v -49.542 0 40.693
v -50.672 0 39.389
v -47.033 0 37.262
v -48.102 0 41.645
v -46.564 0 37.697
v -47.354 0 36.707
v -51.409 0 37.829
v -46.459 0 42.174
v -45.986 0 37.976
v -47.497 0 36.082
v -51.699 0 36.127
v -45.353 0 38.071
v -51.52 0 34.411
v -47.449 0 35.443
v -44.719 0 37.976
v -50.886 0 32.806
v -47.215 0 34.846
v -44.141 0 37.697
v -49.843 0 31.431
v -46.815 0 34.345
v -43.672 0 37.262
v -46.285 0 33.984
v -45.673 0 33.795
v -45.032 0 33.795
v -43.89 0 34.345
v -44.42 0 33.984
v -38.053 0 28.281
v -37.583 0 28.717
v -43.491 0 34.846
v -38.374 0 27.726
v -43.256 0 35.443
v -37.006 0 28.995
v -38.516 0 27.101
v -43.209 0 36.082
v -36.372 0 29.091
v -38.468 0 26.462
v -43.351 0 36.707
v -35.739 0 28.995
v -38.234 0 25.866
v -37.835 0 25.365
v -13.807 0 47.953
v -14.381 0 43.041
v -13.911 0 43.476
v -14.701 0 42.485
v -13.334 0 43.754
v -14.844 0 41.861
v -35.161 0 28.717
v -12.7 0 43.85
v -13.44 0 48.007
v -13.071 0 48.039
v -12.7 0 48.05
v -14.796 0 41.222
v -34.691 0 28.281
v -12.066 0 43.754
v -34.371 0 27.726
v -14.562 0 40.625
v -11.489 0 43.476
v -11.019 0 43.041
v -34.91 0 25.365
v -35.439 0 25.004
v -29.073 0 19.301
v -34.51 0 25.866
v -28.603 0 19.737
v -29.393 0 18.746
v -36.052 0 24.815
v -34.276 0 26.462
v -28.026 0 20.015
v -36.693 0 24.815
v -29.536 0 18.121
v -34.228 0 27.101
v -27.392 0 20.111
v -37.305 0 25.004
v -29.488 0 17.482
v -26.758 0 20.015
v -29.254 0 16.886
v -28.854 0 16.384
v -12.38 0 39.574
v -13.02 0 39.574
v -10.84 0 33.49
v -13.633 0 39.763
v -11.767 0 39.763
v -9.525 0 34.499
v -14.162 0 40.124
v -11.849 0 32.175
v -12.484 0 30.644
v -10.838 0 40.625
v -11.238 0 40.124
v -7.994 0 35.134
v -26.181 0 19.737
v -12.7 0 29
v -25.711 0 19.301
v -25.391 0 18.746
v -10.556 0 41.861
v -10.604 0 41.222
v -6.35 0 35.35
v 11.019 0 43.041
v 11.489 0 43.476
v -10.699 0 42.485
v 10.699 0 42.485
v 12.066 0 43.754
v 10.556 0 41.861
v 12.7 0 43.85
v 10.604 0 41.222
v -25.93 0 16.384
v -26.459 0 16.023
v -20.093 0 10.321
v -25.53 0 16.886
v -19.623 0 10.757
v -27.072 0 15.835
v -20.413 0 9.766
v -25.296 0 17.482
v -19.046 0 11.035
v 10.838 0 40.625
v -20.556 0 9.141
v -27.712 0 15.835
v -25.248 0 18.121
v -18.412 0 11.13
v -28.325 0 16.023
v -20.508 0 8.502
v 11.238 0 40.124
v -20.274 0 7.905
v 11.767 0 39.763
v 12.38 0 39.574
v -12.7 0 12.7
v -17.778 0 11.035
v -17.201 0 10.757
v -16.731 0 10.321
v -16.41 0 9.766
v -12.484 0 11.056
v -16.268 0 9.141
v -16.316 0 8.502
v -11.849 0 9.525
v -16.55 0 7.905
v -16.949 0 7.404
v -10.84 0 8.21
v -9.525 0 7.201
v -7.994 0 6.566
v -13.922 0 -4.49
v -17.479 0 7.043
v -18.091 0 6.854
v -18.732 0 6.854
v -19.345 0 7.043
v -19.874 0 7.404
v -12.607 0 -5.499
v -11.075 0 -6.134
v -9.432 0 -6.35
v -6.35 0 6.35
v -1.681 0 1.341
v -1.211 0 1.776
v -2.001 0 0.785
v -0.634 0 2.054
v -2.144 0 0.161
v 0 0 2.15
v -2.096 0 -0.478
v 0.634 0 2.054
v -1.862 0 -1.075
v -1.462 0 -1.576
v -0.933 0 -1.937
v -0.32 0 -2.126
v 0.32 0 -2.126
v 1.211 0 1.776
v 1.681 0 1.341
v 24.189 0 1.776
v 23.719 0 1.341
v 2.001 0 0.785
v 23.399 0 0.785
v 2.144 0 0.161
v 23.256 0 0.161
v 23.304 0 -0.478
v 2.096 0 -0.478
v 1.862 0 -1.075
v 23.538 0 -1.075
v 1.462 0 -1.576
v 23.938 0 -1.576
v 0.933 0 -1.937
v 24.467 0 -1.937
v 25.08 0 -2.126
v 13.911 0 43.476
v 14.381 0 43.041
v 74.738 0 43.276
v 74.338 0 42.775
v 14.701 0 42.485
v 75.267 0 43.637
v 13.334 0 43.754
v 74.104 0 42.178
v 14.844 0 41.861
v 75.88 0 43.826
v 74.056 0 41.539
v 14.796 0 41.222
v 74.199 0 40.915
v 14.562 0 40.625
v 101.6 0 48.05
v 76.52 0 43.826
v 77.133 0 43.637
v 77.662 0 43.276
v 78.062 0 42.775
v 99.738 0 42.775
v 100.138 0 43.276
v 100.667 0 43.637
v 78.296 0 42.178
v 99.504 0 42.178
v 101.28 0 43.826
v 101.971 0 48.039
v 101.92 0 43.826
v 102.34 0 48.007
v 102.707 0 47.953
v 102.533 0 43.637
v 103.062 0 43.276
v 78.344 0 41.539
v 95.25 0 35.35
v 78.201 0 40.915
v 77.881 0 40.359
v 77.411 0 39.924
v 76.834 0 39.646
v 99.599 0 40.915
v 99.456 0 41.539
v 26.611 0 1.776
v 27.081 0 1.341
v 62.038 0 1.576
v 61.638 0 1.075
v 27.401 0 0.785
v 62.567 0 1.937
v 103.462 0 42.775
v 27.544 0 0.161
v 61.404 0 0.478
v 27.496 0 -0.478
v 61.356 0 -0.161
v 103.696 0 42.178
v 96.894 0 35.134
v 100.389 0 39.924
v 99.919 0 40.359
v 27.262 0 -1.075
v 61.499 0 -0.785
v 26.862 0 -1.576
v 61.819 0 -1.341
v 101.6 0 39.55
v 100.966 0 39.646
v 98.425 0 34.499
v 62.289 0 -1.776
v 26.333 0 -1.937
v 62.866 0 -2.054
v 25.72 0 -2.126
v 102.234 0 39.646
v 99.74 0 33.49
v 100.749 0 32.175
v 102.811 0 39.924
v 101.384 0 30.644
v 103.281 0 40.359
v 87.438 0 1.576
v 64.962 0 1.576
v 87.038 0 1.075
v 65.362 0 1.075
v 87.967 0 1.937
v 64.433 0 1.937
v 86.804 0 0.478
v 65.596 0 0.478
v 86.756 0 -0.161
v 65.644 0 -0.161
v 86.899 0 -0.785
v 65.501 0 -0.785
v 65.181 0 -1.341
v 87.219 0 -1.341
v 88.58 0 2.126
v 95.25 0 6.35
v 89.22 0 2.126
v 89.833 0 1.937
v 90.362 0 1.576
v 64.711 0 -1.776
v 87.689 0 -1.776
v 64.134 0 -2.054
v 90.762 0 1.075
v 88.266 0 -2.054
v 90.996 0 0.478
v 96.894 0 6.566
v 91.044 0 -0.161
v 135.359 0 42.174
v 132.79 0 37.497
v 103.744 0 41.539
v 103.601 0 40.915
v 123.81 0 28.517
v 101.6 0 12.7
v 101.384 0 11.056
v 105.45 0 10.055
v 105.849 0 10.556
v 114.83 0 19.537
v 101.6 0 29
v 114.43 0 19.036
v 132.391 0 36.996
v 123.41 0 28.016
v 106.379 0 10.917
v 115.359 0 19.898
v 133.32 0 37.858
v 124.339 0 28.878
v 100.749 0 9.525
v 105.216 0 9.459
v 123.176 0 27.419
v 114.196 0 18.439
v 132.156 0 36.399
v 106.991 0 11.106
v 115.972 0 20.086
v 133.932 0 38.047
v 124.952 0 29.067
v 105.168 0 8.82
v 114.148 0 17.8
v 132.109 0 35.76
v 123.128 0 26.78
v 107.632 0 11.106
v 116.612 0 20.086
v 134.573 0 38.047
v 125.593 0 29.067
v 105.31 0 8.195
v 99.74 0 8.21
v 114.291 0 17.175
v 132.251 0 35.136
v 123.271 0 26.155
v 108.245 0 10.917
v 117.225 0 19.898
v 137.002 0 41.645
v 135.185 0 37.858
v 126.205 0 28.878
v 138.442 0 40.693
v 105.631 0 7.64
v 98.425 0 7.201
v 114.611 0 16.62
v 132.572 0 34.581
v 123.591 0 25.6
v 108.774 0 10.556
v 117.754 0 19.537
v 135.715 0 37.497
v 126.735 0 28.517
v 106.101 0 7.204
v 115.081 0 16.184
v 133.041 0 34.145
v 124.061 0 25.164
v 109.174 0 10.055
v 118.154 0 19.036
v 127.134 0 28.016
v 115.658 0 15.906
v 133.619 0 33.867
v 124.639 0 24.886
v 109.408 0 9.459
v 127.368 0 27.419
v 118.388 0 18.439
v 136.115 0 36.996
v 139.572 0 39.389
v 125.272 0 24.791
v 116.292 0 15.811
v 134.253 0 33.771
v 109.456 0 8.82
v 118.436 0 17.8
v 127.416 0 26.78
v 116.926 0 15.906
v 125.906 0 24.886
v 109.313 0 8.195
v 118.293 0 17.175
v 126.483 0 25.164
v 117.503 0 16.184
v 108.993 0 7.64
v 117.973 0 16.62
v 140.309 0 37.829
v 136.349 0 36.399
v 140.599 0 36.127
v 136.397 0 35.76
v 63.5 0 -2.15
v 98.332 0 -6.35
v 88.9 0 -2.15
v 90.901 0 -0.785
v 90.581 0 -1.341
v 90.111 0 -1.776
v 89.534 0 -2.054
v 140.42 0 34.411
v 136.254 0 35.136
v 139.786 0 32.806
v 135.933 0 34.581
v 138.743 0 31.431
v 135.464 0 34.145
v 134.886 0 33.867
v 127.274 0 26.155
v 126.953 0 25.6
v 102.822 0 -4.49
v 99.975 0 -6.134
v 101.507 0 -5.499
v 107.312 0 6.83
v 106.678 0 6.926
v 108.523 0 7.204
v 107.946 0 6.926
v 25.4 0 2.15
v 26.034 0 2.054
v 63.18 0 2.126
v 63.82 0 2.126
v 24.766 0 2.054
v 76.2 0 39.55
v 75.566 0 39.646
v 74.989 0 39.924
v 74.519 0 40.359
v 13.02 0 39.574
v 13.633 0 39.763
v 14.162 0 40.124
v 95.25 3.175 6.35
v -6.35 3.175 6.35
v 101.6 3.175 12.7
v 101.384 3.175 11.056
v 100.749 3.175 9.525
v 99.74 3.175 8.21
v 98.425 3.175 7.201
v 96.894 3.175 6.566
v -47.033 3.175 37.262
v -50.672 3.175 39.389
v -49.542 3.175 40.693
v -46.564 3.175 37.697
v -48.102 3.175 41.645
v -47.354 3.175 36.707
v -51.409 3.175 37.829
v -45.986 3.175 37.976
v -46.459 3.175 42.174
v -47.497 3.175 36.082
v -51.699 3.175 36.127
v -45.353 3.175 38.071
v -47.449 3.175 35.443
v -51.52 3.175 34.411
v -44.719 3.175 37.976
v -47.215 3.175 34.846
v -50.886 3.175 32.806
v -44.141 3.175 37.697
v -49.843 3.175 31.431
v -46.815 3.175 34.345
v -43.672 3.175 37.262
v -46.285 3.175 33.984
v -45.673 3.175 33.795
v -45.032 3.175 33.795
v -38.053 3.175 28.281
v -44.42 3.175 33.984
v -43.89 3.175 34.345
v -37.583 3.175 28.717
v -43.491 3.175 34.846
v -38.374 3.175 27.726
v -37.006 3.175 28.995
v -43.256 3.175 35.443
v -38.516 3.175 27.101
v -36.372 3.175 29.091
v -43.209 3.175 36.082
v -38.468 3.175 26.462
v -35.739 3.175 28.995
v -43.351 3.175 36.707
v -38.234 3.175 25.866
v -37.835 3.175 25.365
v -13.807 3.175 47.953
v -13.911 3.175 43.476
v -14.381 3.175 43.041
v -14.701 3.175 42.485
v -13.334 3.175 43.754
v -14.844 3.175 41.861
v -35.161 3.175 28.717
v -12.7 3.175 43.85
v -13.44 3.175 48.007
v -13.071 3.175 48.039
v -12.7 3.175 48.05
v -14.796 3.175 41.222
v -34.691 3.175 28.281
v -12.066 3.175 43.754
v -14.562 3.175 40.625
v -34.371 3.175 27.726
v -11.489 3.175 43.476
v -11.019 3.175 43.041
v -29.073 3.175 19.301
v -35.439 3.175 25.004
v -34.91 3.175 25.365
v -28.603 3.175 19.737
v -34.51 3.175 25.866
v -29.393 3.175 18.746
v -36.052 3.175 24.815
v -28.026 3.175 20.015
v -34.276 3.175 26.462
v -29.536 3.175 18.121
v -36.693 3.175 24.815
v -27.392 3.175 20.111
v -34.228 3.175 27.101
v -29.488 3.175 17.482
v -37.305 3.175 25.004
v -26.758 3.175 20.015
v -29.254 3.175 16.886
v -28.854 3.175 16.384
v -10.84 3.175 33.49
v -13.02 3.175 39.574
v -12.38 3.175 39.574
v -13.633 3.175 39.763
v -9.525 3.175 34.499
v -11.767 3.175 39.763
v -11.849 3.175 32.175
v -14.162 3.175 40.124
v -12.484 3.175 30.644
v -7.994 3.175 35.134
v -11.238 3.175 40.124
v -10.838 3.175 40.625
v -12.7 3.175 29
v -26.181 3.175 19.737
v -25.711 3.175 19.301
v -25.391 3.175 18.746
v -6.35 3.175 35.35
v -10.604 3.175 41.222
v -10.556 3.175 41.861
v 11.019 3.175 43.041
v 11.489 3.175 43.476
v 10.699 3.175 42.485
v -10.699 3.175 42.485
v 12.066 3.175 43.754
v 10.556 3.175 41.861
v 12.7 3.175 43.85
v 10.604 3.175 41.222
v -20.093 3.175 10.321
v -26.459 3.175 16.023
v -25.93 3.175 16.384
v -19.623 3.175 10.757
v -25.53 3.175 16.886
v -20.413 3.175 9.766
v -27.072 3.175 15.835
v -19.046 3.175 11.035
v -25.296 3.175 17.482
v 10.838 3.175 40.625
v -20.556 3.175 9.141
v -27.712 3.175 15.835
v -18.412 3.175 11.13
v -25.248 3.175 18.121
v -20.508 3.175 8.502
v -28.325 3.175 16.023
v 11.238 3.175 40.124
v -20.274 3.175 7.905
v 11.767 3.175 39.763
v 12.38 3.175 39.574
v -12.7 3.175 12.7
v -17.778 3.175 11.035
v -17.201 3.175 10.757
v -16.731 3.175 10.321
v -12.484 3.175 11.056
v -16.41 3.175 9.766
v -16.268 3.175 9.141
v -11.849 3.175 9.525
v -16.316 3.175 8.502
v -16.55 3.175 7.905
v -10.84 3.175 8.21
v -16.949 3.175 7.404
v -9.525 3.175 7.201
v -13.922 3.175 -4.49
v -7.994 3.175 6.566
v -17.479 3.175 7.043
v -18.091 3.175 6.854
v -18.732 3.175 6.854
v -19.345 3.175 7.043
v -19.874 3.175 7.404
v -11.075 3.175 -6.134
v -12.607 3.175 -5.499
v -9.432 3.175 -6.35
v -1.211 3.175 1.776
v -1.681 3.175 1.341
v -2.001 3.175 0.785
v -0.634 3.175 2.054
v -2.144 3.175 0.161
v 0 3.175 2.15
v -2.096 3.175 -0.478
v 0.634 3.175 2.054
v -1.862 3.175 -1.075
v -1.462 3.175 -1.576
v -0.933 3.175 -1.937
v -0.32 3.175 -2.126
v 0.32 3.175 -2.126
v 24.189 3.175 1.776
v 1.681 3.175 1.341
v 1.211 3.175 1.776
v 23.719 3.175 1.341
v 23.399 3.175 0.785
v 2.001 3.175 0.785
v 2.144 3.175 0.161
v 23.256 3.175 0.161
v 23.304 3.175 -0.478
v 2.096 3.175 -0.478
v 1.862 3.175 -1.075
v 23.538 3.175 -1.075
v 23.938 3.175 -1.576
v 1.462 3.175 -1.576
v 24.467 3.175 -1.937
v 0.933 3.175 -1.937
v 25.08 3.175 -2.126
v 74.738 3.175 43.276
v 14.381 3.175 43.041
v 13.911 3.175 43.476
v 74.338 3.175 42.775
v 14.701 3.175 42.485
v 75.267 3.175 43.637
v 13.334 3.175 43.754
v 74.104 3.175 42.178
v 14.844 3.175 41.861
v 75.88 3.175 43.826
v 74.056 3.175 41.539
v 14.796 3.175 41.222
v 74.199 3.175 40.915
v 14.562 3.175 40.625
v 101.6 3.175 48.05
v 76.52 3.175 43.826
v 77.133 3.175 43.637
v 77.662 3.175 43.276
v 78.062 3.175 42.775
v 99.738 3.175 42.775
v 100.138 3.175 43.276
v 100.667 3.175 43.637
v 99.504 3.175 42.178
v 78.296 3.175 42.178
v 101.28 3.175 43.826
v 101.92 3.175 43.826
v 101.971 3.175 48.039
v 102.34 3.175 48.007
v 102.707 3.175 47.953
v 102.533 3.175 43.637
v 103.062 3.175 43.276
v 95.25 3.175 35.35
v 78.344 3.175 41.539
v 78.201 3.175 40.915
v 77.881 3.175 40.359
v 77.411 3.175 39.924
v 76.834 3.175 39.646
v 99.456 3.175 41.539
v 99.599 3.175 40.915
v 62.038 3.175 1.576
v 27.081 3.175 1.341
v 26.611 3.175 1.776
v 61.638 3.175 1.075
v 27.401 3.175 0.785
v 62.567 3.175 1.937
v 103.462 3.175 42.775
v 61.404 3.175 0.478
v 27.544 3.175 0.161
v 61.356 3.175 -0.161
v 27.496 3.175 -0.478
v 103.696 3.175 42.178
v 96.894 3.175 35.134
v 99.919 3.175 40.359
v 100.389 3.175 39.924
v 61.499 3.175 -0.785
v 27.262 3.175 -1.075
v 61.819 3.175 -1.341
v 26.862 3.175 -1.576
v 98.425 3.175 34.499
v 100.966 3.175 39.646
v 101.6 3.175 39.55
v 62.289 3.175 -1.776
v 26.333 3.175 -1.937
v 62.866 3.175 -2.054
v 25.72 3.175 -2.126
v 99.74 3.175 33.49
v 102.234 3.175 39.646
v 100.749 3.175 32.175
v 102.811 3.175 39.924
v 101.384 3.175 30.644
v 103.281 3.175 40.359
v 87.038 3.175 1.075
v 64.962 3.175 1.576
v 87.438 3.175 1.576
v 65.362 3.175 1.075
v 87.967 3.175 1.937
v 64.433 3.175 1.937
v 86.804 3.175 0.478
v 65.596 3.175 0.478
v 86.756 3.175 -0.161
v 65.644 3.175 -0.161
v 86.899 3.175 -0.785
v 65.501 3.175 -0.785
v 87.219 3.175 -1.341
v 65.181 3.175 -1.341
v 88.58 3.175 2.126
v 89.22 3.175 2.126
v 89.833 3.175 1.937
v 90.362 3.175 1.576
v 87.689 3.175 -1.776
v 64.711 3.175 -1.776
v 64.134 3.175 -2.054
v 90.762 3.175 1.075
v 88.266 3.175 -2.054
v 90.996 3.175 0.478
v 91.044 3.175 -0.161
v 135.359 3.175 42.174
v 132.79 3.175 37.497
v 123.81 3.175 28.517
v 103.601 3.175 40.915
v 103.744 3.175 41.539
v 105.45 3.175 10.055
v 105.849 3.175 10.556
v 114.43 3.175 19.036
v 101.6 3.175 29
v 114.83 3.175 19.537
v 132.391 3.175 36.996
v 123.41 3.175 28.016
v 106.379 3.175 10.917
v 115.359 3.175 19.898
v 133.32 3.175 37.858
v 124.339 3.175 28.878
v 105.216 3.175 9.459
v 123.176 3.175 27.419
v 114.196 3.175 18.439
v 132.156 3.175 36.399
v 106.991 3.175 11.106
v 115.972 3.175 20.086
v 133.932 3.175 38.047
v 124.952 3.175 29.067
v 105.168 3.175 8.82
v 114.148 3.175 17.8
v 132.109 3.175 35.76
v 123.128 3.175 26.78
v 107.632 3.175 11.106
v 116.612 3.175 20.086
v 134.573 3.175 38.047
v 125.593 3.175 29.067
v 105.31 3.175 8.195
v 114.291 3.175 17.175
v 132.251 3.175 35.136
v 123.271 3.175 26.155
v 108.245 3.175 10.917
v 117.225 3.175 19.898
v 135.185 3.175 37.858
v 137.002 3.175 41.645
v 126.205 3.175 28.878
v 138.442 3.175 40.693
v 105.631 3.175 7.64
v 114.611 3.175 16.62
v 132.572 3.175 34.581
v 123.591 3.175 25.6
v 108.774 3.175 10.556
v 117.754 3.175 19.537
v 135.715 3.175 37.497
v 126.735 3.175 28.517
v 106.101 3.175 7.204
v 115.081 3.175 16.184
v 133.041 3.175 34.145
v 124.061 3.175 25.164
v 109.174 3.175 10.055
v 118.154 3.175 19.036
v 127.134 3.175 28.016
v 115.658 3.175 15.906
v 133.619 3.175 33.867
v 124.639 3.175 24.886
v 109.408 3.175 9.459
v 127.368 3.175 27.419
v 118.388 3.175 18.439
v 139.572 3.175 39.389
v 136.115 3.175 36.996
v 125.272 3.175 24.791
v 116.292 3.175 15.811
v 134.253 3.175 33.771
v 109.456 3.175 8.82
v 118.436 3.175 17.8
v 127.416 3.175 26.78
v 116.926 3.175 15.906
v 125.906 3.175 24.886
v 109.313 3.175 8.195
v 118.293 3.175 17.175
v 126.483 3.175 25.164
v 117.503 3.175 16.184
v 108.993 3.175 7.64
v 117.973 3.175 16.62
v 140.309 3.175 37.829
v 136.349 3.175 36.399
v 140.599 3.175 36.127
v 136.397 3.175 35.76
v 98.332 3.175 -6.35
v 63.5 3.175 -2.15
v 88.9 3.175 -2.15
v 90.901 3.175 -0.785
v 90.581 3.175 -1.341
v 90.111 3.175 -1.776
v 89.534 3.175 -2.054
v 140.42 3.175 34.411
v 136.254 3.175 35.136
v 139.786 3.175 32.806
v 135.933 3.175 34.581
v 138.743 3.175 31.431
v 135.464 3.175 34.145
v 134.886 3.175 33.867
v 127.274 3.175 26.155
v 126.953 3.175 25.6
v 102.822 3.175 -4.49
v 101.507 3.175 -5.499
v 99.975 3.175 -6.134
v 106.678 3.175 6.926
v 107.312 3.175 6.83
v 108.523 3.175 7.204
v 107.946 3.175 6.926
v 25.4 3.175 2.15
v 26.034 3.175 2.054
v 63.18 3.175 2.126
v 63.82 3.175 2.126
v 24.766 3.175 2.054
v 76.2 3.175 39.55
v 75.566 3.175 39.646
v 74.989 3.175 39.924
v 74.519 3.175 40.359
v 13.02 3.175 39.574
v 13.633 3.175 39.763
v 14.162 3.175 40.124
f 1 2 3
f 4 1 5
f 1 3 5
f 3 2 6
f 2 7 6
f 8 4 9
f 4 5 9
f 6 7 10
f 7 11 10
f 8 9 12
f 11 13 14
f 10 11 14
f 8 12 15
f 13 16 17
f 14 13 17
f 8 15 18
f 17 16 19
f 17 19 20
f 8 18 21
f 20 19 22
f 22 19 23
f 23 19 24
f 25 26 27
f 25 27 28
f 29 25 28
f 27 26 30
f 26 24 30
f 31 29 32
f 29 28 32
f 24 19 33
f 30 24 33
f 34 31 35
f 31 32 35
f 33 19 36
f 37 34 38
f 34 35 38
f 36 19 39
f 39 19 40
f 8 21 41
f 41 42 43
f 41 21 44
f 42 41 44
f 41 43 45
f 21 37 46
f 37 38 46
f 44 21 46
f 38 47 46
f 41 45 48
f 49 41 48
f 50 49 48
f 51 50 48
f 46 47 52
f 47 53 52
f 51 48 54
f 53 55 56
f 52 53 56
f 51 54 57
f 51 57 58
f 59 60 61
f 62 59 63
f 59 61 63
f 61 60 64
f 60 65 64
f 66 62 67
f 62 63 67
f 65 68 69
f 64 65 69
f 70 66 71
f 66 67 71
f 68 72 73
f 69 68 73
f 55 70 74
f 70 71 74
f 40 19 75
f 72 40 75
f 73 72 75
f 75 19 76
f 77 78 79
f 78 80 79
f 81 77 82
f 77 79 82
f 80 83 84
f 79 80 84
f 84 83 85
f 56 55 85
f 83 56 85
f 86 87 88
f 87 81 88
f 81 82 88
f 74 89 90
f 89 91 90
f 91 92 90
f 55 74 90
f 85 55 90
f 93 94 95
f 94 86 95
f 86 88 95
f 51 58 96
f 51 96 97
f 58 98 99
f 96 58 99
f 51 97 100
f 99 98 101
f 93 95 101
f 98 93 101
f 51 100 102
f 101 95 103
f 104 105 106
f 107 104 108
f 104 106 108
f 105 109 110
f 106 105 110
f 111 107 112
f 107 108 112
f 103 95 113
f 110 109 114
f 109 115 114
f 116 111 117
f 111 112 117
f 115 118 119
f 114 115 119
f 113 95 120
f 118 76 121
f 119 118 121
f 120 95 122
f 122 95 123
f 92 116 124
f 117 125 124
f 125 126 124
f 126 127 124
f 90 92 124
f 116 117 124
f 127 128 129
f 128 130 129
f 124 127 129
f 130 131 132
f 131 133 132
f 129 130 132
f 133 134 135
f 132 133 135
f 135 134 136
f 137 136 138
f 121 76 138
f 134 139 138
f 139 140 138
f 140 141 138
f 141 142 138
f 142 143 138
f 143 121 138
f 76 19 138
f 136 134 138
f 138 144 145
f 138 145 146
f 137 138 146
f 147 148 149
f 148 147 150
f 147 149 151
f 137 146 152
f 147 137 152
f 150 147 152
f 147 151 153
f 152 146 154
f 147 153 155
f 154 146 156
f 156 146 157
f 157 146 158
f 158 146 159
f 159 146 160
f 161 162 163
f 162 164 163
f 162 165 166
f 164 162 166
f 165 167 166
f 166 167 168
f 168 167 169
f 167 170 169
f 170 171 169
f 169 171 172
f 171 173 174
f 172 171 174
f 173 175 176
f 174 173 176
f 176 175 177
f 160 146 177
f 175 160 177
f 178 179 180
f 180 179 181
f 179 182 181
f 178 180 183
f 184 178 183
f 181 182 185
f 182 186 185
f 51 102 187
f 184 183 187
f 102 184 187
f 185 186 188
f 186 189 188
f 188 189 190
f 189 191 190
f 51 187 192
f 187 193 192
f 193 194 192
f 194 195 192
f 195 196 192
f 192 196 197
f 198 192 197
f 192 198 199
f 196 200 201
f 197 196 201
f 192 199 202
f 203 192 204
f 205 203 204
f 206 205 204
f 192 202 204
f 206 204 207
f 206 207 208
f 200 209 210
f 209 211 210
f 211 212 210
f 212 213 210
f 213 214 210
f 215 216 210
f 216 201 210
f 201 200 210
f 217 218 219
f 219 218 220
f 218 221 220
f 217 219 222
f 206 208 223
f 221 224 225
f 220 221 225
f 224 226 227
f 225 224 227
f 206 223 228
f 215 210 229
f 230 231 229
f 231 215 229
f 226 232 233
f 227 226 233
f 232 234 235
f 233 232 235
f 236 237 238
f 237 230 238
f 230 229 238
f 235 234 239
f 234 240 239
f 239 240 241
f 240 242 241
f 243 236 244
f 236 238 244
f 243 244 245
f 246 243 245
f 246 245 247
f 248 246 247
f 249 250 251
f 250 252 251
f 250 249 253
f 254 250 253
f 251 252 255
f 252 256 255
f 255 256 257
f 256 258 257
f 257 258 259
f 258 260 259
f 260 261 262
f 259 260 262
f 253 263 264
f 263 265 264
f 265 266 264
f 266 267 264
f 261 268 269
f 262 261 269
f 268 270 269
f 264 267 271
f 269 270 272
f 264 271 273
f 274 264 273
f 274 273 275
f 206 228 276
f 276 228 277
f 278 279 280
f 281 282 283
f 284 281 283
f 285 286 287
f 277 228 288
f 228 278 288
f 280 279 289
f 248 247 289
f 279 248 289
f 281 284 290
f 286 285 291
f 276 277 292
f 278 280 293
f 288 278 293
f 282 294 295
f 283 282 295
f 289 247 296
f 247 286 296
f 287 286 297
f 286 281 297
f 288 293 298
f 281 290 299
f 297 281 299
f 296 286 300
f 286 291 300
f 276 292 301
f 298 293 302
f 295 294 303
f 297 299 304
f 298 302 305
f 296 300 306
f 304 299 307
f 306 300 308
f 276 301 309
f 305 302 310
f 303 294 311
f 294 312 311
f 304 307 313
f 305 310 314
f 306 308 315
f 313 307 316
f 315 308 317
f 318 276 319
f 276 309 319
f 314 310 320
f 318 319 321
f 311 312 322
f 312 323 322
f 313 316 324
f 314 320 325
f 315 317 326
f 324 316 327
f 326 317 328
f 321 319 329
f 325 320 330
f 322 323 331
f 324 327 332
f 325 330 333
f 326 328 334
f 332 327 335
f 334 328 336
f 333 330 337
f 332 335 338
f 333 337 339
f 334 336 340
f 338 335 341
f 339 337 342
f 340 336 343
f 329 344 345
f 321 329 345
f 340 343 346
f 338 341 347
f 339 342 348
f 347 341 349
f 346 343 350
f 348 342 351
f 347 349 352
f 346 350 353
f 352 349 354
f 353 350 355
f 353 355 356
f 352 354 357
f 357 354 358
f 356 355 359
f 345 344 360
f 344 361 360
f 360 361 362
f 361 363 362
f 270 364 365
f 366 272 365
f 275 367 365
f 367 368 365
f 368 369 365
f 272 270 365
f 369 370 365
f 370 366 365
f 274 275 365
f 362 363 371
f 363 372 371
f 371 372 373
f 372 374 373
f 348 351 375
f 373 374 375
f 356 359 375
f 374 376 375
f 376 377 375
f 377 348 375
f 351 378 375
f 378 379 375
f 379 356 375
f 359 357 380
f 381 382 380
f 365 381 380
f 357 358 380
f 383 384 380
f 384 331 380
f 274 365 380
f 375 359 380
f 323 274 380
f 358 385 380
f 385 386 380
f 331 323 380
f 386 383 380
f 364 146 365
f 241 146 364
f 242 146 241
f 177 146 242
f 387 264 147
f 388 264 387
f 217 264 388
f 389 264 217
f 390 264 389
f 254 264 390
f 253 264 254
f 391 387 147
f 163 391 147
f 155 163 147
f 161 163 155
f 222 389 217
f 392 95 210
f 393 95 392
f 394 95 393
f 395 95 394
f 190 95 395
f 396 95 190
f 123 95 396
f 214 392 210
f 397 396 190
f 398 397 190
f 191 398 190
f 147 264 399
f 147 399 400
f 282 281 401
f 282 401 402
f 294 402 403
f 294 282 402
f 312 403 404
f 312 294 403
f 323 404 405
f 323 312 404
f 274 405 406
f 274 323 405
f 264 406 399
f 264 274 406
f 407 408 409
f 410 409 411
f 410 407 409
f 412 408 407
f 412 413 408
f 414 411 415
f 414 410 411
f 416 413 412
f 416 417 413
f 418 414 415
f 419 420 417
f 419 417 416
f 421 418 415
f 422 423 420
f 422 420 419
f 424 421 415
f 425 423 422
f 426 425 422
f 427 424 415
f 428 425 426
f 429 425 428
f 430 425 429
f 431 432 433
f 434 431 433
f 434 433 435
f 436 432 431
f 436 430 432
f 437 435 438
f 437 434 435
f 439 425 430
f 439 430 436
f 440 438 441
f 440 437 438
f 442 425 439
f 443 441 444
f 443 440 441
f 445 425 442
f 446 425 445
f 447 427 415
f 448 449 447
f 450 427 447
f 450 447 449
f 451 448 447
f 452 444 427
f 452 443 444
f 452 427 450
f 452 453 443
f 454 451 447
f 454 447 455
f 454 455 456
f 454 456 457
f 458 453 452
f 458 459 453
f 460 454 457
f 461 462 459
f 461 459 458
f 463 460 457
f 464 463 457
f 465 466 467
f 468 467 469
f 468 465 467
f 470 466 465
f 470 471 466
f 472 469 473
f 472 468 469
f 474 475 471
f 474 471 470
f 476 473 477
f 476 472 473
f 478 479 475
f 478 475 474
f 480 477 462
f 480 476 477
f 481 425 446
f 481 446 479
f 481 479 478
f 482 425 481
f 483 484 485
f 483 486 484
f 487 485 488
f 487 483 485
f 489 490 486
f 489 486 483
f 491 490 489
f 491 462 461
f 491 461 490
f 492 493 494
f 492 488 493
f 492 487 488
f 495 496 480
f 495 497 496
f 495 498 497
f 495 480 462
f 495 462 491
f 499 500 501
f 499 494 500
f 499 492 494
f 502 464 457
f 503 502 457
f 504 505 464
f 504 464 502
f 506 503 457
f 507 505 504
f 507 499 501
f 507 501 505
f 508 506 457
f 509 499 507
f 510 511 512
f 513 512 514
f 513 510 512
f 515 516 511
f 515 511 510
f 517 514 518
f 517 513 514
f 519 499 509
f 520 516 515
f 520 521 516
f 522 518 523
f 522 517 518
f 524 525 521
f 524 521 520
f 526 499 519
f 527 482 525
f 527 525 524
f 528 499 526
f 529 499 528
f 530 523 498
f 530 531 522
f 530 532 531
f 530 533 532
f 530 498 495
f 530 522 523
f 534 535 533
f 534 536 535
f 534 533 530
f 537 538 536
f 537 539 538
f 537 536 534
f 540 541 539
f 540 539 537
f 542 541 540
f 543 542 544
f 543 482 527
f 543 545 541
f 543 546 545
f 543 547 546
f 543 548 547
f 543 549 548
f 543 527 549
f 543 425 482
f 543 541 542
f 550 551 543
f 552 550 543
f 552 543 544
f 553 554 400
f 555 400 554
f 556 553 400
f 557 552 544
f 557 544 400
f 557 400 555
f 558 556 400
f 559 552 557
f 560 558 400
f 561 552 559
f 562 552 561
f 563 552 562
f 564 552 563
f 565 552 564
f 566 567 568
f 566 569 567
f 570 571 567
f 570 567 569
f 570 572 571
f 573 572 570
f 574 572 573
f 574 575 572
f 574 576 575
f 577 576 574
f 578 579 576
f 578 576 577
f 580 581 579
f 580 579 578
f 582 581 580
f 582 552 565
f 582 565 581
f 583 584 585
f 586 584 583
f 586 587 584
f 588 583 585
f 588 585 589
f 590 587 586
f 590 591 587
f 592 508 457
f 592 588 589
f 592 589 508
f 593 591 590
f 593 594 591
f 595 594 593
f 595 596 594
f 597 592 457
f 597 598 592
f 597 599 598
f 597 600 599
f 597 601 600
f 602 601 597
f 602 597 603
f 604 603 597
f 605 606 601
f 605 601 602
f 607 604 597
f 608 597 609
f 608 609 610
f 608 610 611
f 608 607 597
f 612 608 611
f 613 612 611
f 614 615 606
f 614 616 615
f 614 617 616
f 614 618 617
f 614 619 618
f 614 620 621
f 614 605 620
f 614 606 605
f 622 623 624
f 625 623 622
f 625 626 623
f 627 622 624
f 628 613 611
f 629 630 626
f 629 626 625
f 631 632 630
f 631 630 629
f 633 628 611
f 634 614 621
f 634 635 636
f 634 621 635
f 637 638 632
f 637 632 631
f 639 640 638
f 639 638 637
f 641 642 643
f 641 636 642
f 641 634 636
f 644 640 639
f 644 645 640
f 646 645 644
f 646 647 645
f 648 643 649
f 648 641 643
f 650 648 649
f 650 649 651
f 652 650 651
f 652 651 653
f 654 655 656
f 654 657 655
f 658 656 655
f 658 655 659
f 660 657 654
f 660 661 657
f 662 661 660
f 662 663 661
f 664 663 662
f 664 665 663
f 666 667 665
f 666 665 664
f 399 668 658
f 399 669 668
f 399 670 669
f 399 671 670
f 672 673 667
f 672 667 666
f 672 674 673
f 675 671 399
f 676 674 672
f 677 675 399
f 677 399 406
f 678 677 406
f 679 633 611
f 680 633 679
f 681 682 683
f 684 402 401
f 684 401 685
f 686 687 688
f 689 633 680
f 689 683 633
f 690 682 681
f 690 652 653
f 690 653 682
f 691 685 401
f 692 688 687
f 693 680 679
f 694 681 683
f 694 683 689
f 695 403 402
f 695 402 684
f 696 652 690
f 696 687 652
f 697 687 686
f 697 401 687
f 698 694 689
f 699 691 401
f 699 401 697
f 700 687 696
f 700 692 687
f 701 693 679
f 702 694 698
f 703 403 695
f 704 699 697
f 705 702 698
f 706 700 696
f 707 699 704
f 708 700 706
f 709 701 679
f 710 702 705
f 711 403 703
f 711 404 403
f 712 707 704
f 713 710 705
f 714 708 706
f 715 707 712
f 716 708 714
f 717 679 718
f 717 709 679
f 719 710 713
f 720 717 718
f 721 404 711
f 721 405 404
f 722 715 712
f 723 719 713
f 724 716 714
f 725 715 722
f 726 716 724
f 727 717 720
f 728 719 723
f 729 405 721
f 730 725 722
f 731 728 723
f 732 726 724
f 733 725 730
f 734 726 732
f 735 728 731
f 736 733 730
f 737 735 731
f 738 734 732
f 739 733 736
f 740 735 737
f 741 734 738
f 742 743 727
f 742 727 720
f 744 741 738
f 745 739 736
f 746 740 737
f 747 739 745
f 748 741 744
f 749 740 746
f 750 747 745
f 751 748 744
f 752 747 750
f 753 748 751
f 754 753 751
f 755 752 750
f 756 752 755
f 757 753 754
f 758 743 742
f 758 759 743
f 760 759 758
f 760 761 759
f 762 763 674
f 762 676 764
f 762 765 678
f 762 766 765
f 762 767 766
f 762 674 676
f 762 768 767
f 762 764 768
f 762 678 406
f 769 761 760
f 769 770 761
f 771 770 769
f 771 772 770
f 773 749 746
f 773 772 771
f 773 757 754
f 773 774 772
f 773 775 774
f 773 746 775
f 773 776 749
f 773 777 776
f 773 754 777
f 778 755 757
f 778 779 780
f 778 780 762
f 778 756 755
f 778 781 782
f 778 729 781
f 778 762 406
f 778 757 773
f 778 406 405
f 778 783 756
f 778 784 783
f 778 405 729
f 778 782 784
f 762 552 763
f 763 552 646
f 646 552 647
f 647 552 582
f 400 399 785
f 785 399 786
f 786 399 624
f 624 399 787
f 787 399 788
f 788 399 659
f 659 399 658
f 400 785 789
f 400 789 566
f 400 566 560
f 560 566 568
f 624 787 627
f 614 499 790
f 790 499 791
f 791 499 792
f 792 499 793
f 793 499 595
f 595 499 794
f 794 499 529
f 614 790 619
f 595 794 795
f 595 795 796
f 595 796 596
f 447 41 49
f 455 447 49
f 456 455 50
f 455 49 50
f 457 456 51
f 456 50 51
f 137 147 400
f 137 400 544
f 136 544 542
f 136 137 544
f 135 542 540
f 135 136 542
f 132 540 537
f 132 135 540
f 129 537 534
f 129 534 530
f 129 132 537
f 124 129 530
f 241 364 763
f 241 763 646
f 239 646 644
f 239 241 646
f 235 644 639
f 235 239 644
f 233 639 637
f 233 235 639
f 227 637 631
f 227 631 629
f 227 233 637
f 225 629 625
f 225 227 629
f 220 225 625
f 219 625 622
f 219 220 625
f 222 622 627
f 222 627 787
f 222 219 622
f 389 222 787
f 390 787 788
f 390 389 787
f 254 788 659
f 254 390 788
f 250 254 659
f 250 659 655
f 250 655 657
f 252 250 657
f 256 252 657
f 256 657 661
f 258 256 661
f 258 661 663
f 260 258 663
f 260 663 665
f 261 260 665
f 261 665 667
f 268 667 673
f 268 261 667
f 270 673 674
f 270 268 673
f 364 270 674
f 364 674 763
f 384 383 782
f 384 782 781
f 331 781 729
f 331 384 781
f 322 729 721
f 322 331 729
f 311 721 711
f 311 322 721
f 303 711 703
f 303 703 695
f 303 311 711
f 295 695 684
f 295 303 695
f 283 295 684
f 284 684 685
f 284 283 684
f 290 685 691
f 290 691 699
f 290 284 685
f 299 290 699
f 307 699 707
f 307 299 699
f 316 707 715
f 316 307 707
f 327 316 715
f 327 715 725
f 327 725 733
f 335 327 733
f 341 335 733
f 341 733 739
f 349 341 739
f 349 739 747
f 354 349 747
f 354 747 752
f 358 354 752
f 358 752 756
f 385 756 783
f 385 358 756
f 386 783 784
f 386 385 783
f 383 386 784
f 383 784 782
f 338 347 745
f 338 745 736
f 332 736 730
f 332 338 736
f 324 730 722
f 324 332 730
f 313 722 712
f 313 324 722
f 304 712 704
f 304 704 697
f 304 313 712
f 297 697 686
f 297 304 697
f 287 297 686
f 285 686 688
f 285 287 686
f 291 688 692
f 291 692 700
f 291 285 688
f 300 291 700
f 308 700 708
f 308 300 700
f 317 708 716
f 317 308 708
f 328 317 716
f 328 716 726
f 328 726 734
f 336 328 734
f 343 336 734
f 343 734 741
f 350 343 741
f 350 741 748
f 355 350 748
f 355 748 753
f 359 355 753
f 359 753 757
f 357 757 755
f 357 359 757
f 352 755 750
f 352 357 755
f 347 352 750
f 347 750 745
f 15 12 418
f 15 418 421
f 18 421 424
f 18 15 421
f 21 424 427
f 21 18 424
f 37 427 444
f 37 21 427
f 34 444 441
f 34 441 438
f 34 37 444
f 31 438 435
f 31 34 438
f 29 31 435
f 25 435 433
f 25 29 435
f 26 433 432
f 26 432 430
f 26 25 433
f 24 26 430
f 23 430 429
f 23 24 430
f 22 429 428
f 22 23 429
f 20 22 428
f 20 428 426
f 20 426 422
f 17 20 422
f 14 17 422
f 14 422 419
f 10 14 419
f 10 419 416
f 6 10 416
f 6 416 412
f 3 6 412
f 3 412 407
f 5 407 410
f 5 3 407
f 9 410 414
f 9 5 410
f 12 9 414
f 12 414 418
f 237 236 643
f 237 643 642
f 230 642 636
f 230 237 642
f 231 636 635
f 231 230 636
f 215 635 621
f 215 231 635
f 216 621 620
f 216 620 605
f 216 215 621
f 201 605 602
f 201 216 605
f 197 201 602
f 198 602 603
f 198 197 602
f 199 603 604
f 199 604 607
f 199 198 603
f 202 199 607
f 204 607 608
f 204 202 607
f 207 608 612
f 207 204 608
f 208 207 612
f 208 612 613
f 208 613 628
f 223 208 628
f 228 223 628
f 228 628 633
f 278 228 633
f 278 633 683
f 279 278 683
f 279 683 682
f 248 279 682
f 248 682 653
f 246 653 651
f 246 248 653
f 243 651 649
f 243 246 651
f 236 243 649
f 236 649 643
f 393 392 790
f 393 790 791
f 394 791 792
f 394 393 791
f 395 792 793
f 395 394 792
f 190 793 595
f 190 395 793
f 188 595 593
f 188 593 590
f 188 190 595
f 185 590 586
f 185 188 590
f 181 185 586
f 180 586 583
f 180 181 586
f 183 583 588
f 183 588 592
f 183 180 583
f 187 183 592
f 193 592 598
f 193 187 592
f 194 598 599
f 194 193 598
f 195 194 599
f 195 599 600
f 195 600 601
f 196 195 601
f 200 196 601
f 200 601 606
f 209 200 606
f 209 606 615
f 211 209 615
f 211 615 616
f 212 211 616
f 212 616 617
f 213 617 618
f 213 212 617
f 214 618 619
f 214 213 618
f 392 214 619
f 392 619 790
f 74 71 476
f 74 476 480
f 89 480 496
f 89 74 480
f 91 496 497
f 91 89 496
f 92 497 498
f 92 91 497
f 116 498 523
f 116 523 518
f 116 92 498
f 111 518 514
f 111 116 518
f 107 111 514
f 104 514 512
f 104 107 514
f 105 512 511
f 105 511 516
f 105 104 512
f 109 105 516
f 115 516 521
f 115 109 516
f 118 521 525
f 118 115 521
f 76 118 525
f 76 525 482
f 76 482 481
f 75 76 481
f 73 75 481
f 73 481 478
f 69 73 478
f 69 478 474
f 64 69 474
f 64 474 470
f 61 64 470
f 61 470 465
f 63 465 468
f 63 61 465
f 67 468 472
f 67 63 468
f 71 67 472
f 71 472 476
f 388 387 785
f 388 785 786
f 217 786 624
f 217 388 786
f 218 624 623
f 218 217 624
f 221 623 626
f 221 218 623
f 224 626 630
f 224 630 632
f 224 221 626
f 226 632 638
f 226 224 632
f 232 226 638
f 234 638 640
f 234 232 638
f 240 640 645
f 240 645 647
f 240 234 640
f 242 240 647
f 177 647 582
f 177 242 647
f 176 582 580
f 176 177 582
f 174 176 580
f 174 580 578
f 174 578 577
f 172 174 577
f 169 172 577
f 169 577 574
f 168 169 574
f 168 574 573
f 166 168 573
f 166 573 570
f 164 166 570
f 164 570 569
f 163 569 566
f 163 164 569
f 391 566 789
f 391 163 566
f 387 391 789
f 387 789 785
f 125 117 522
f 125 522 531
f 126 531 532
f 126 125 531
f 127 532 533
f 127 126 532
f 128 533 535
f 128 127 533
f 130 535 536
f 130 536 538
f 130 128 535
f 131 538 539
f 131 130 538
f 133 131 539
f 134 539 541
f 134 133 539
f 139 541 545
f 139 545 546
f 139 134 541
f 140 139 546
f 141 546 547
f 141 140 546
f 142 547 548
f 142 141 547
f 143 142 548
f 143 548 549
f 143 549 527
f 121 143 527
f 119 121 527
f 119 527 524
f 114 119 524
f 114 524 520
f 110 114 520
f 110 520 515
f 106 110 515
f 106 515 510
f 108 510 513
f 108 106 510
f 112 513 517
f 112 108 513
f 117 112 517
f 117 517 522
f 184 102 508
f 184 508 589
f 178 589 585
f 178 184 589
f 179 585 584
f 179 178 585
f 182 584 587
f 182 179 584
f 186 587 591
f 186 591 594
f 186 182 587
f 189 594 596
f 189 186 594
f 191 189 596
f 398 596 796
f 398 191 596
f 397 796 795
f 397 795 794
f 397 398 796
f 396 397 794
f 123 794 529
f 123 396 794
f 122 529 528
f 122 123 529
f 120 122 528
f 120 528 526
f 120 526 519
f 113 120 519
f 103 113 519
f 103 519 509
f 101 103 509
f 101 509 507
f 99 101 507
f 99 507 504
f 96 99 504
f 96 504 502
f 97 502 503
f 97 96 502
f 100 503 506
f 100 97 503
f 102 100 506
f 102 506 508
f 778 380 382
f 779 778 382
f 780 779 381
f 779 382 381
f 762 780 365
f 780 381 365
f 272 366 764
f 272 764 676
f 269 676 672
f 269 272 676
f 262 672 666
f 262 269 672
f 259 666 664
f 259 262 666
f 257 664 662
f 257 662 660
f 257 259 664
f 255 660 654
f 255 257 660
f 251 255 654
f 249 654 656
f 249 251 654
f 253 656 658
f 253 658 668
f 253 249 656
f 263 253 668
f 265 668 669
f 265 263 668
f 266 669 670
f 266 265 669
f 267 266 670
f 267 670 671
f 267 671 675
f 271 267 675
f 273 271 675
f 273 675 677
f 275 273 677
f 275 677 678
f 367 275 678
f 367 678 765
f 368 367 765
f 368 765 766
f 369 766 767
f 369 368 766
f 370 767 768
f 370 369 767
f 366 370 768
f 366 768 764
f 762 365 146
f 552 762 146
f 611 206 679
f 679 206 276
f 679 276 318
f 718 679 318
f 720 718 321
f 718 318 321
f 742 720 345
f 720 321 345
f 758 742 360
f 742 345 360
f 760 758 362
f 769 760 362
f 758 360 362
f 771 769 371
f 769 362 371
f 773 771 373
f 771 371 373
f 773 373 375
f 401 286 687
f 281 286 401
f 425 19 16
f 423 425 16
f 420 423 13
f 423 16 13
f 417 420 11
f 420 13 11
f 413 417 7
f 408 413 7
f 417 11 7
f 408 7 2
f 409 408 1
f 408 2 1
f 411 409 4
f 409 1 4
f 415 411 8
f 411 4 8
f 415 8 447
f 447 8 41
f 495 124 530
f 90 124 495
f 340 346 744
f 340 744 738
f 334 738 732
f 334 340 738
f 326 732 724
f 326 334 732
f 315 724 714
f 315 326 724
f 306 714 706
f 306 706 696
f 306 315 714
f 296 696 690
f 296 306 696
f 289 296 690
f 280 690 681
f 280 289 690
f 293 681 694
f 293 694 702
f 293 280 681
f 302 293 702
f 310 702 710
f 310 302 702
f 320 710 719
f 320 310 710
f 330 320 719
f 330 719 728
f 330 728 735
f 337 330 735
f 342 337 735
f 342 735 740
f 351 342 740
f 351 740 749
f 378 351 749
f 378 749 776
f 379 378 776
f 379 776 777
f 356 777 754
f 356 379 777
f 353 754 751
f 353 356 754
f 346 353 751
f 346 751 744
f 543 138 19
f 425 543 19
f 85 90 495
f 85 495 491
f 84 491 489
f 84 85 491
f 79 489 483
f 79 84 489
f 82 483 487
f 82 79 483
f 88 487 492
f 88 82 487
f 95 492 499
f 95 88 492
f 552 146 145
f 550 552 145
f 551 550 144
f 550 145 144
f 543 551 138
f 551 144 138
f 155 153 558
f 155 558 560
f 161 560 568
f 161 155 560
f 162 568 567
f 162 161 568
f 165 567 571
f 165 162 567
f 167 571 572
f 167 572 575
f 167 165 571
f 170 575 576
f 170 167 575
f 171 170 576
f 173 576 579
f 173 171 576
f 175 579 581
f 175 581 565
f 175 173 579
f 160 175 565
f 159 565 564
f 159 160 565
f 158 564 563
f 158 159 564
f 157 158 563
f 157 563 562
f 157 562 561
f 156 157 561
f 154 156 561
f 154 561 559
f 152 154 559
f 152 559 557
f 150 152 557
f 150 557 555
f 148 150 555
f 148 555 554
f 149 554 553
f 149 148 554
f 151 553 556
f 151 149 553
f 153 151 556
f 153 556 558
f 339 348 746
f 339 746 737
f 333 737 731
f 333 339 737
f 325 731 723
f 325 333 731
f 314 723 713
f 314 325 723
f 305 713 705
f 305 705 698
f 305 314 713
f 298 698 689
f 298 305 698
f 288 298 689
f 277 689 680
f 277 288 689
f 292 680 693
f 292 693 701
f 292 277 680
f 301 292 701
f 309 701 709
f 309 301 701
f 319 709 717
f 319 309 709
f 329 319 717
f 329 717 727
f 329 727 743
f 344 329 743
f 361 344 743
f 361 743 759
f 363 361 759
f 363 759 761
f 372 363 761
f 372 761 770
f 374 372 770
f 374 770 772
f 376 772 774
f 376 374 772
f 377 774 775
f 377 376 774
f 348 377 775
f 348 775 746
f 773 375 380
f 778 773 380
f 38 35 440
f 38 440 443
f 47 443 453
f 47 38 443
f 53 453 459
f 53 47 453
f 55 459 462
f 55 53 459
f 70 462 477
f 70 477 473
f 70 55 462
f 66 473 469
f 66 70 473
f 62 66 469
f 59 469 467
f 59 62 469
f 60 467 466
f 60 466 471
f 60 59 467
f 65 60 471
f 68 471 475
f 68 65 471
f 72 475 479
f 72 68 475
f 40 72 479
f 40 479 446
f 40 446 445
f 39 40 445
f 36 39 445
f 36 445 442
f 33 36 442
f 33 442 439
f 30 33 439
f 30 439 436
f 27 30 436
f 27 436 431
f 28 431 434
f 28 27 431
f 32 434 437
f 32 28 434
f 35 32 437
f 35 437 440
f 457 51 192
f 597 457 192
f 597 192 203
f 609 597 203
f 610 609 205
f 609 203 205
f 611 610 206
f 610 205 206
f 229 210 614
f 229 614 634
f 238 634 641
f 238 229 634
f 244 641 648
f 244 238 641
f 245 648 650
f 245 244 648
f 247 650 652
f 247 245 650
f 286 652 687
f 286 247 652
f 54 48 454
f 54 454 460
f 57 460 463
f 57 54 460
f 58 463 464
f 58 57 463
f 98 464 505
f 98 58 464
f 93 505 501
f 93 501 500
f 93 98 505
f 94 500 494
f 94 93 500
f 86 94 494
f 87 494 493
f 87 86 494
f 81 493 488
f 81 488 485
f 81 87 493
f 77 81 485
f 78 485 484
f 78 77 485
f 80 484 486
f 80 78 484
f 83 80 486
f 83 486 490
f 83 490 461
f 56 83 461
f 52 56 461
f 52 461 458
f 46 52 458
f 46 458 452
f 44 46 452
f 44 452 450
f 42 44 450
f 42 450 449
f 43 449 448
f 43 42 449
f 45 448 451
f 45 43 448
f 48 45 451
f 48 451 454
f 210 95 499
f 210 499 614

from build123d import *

# Parameters (mm, degrees)
SKETCH1_R           = 2.15
BOSS_EXTRUDE1_DEPTH = 3.175


with BuildPart() as part:
    # Sketch1 → Boss-Extrude1 (new body)
    with BuildSketch(Plane(origin=(0, 0, 0), x_dir=(1, 0, 0), z_dir=(0, 1, 0))):
        with BuildLine():
            Line((98.331536726, 6.35), (-9.431536726, 6.35))
            ThreePointArc((-9.431536726, 6.35), (-11.861576522, 5.866635031), (-13.921664787, 4.490128061))
            Line((-13.921664787, 4.490128061), (-49.842689271, -31.430896424))
            ThreePointArc((-49.842689271, -31.430896424), (-51.409271688, -37.828577417), (-46.459210265, -42.173850075))
            Line((-46.459210265, -42.173850075), (-13.806649055, -47.952825591))
            ThreePointArc((-13.806649055, -47.952825591), (-13.255453642, -48.025659748), (-12.7, -48.05))
            Line((-12.7, -48.05), (101.6, -48.05))
            ThreePointArc((101.6, -48.05), (102.155453642, -48.025659748), (102.706649055, -47.952825591))
            Line((102.706649055, -47.952825591), (135.359210265, -42.173850075))
            ThreePointArc((135.359210265, -42.173850075), (140.309271688, -37.828577417), (138.742689271, -31.430896424))
            Line((138.742689271, -31.430896424), (102.821664787, 4.490128061))
            ThreePointArc((102.821664787, 4.490128061), (100.761576522, 5.866635031), (98.331536726, 6.35))
        make_face()
        with Locations(Location((0, 0, 0), (0, 0, 270))):
            Circle(SKETCH1_R, mode=Mode.SUBTRACT)
        with Locations(Location((25.4, 0, 0), (0, 0, 270))):
            Circle(SKETCH1_R, mode=Mode.SUBTRACT)
        with Locations(Location((-18.411792847, -8.980256121, 0), (0, 0, 270))):
            Circle(SKETCH1_R, mode=Mode.SUBTRACT)
        with Locations(Location((-27.392048969, -17.960512242, 0), (0, 0, 270))):
            Circle(SKETCH1_R, mode=Mode.SUBTRACT)
        with Locations(Location((-36.37230509, -26.940768363, 0), (0, 0, 270))):
            Circle(SKETCH1_R, mode=Mode.SUBTRACT)
        with Locations(Location((-45.352561211, -35.921024484, 0), (0, 0, 270))):
            Circle(SKETCH1_R, mode=Mode.SUBTRACT)
        with Locations(Location((-12.7, -41.7, 0), (0, 0, 270))):
            Circle(SKETCH1_R, mode=Mode.SUBTRACT)
        with Locations(Location((12.7, -41.7, 0), (0, 0, 270))):
            Circle(SKETCH1_R, mode=Mode.SUBTRACT)
        with Locations(Location((63.5, 0, 0), (0, 0, 90))):
            Circle(SKETCH1_R, mode=Mode.SUBTRACT)
        with Locations(Location((88.9, 0, 0), (0, 0, 90))):
            Circle(SKETCH1_R, mode=Mode.SUBTRACT)
        with Locations(Location((107.311792847, -8.980256121, 0), (0, 0, 90))):
            Circle(SKETCH1_R, mode=Mode.SUBTRACT)
        with Locations(Location((116.292048969, -17.960512242, 0), (0, 0, 90))):
            Circle(SKETCH1_R, mode=Mode.SUBTRACT)
        with Locations(Location((134.252561211, -35.921024484, 0), (0, 0, 90))):
            Circle(SKETCH1_R, mode=Mode.SUBTRACT)
        with Locations(Location((125.27230509, -26.940768363, 0), (0, 0, 90))):
            Circle(SKETCH1_R, mode=Mode.SUBTRACT)
        with Locations(Location((76.2, -41.7, 0), (0, 0, 90))):
            Circle(SKETCH1_R, mode=Mode.SUBTRACT)
        with Locations(Location((101.6, -41.7, 0), (0, 0, 90))):
            Circle(SKETCH1_R, mode=Mode.SUBTRACT)
        with BuildLine():
            Line((95.25, -6.35), (-6.35, -6.35))
            ThreePointArc((-6.35, -6.35), (-10.840128061, -8.209871939), (-12.7, -12.7))
            Line((-12.7, -12.7), (-12.7, -29))
            ThreePointArc((-12.7, -29), (-10.840128061, -33.490128061), (-6.35, -35.35))
            Line((-6.35, -35.35), (95.25, -35.35))
            ThreePointArc((95.25, -35.35), (99.740128061, -33.490128061), (101.6, -29))
            Line((101.6, -29), (101.6, -12.7))
            ThreePointArc((101.6, -12.7), (99.740128061, -8.209871939), (95.25, -6.35))
        make_face(mode=Mode.SUBTRACT)
    extrude(amount=BOSS_EXTRUDE1_DEPTH)


solid = part.part
